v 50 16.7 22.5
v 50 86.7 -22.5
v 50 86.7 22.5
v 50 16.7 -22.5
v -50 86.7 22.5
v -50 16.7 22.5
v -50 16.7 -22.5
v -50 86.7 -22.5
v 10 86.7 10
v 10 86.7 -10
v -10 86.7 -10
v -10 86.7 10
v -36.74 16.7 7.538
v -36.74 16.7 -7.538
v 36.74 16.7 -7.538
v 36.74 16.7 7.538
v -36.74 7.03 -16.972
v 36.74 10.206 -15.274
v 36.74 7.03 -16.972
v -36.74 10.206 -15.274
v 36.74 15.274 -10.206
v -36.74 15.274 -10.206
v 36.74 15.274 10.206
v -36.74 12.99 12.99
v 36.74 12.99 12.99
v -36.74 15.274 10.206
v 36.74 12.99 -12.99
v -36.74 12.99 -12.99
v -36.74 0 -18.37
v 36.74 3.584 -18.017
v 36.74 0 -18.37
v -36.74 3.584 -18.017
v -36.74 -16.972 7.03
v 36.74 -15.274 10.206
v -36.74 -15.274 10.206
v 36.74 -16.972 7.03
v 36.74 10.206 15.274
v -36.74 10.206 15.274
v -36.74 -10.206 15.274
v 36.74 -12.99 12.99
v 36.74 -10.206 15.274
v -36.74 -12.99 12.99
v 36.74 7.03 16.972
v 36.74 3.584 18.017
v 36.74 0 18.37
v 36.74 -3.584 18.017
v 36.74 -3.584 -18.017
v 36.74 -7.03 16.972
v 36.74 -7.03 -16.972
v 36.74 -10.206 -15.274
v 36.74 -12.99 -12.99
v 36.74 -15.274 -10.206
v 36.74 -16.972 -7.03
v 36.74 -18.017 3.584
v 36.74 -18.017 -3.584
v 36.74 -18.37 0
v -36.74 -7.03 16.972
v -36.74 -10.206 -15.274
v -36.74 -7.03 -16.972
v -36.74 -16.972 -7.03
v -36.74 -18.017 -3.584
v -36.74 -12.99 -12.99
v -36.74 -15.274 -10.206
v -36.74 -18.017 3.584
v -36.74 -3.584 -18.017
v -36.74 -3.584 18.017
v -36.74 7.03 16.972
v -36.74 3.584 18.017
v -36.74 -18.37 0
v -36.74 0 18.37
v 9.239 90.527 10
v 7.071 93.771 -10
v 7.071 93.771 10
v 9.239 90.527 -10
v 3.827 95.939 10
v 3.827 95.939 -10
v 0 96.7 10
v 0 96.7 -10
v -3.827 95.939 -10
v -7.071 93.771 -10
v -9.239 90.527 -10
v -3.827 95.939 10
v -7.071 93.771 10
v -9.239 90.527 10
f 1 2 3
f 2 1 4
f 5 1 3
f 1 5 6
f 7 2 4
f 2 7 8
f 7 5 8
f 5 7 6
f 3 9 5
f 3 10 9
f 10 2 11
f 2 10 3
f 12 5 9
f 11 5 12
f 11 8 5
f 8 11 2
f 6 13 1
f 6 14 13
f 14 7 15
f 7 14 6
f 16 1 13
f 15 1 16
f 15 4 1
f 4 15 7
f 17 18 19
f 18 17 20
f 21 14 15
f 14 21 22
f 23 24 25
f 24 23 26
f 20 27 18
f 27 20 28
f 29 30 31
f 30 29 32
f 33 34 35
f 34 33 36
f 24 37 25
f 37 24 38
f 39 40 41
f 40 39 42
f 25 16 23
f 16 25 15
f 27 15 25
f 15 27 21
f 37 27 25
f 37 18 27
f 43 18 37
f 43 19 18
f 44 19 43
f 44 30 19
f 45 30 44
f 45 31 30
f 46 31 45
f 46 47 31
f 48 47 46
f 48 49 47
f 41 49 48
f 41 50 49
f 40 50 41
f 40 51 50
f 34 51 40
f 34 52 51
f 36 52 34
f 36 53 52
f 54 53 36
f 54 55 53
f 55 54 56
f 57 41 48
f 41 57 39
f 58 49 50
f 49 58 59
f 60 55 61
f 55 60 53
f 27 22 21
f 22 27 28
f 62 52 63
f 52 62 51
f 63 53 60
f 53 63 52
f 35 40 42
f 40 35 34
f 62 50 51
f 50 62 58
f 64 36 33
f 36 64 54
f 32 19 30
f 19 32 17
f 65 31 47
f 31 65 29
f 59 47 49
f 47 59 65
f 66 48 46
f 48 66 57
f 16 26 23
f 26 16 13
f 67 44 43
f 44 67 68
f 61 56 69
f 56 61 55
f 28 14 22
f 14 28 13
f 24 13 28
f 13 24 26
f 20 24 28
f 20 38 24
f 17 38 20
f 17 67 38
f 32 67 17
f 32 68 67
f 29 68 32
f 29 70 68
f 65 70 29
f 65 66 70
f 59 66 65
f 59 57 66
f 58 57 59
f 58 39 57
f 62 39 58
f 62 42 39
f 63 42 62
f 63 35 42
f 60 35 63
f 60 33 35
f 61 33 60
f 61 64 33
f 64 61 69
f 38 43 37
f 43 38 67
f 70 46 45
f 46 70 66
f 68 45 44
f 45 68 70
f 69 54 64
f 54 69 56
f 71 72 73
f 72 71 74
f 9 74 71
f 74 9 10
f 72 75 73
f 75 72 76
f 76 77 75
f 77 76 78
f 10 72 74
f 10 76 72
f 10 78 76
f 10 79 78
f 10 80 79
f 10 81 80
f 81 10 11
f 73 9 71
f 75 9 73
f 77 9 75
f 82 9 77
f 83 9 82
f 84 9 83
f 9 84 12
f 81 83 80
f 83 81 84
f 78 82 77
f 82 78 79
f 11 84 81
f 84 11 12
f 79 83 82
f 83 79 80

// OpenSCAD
// Auto-generated by scripts/author_from_manifest.py (Phase D.3).
// Source: data/phase_d_manifest.json (sku_intent='potter-vsr-flow-switch-4in').
// Do not hand-edit — regenerate from the manifest.
//
// @part potter_vsr_flow_switch_4in
// @kind device
// @category trim.flow.switch
// @display-name "Potter VSR Vane Flow Switch 4\""
// @mfg potter_electric_signal
// @mfg-pn VSR-4
// @listing UL FM
// @price-usd 135.00
// @install-minutes 18
// @crew journeyman
// @param size_in number default=4 label="Size" unit="in"
// @port pipe position=[0,0,0] direction=[-1,0,0] style=grooved size_in=4 role=run_a

size_in = 4.0;

function od_mm(nps) =
    nps ==   1  ? 33.4 :
    nps == 1.25 ? 42.2 :
    nps == 1.5  ? 48.3 :
    nps ==   2  ? 60.3 : 33.4;

od = od_mm(size_in);
box_w = 100;
box_h = 70;
box_d = 45;

union() {
    // Enclosure
    translate([0, box_h/2 + od/2, 0])
        cube([box_w, box_h, box_d], center = true);
    // Pipe saddle stub
    rotate([0, 90, 0])
        cylinder(h = od * 2.2, d = od * 1.1, center = true, $fn = 32);
    // Conduit nipple
    translate([0, box_h + od/2, 0])
        cylinder(h = 20, d = 20, center = true, $fn = 16);
}
